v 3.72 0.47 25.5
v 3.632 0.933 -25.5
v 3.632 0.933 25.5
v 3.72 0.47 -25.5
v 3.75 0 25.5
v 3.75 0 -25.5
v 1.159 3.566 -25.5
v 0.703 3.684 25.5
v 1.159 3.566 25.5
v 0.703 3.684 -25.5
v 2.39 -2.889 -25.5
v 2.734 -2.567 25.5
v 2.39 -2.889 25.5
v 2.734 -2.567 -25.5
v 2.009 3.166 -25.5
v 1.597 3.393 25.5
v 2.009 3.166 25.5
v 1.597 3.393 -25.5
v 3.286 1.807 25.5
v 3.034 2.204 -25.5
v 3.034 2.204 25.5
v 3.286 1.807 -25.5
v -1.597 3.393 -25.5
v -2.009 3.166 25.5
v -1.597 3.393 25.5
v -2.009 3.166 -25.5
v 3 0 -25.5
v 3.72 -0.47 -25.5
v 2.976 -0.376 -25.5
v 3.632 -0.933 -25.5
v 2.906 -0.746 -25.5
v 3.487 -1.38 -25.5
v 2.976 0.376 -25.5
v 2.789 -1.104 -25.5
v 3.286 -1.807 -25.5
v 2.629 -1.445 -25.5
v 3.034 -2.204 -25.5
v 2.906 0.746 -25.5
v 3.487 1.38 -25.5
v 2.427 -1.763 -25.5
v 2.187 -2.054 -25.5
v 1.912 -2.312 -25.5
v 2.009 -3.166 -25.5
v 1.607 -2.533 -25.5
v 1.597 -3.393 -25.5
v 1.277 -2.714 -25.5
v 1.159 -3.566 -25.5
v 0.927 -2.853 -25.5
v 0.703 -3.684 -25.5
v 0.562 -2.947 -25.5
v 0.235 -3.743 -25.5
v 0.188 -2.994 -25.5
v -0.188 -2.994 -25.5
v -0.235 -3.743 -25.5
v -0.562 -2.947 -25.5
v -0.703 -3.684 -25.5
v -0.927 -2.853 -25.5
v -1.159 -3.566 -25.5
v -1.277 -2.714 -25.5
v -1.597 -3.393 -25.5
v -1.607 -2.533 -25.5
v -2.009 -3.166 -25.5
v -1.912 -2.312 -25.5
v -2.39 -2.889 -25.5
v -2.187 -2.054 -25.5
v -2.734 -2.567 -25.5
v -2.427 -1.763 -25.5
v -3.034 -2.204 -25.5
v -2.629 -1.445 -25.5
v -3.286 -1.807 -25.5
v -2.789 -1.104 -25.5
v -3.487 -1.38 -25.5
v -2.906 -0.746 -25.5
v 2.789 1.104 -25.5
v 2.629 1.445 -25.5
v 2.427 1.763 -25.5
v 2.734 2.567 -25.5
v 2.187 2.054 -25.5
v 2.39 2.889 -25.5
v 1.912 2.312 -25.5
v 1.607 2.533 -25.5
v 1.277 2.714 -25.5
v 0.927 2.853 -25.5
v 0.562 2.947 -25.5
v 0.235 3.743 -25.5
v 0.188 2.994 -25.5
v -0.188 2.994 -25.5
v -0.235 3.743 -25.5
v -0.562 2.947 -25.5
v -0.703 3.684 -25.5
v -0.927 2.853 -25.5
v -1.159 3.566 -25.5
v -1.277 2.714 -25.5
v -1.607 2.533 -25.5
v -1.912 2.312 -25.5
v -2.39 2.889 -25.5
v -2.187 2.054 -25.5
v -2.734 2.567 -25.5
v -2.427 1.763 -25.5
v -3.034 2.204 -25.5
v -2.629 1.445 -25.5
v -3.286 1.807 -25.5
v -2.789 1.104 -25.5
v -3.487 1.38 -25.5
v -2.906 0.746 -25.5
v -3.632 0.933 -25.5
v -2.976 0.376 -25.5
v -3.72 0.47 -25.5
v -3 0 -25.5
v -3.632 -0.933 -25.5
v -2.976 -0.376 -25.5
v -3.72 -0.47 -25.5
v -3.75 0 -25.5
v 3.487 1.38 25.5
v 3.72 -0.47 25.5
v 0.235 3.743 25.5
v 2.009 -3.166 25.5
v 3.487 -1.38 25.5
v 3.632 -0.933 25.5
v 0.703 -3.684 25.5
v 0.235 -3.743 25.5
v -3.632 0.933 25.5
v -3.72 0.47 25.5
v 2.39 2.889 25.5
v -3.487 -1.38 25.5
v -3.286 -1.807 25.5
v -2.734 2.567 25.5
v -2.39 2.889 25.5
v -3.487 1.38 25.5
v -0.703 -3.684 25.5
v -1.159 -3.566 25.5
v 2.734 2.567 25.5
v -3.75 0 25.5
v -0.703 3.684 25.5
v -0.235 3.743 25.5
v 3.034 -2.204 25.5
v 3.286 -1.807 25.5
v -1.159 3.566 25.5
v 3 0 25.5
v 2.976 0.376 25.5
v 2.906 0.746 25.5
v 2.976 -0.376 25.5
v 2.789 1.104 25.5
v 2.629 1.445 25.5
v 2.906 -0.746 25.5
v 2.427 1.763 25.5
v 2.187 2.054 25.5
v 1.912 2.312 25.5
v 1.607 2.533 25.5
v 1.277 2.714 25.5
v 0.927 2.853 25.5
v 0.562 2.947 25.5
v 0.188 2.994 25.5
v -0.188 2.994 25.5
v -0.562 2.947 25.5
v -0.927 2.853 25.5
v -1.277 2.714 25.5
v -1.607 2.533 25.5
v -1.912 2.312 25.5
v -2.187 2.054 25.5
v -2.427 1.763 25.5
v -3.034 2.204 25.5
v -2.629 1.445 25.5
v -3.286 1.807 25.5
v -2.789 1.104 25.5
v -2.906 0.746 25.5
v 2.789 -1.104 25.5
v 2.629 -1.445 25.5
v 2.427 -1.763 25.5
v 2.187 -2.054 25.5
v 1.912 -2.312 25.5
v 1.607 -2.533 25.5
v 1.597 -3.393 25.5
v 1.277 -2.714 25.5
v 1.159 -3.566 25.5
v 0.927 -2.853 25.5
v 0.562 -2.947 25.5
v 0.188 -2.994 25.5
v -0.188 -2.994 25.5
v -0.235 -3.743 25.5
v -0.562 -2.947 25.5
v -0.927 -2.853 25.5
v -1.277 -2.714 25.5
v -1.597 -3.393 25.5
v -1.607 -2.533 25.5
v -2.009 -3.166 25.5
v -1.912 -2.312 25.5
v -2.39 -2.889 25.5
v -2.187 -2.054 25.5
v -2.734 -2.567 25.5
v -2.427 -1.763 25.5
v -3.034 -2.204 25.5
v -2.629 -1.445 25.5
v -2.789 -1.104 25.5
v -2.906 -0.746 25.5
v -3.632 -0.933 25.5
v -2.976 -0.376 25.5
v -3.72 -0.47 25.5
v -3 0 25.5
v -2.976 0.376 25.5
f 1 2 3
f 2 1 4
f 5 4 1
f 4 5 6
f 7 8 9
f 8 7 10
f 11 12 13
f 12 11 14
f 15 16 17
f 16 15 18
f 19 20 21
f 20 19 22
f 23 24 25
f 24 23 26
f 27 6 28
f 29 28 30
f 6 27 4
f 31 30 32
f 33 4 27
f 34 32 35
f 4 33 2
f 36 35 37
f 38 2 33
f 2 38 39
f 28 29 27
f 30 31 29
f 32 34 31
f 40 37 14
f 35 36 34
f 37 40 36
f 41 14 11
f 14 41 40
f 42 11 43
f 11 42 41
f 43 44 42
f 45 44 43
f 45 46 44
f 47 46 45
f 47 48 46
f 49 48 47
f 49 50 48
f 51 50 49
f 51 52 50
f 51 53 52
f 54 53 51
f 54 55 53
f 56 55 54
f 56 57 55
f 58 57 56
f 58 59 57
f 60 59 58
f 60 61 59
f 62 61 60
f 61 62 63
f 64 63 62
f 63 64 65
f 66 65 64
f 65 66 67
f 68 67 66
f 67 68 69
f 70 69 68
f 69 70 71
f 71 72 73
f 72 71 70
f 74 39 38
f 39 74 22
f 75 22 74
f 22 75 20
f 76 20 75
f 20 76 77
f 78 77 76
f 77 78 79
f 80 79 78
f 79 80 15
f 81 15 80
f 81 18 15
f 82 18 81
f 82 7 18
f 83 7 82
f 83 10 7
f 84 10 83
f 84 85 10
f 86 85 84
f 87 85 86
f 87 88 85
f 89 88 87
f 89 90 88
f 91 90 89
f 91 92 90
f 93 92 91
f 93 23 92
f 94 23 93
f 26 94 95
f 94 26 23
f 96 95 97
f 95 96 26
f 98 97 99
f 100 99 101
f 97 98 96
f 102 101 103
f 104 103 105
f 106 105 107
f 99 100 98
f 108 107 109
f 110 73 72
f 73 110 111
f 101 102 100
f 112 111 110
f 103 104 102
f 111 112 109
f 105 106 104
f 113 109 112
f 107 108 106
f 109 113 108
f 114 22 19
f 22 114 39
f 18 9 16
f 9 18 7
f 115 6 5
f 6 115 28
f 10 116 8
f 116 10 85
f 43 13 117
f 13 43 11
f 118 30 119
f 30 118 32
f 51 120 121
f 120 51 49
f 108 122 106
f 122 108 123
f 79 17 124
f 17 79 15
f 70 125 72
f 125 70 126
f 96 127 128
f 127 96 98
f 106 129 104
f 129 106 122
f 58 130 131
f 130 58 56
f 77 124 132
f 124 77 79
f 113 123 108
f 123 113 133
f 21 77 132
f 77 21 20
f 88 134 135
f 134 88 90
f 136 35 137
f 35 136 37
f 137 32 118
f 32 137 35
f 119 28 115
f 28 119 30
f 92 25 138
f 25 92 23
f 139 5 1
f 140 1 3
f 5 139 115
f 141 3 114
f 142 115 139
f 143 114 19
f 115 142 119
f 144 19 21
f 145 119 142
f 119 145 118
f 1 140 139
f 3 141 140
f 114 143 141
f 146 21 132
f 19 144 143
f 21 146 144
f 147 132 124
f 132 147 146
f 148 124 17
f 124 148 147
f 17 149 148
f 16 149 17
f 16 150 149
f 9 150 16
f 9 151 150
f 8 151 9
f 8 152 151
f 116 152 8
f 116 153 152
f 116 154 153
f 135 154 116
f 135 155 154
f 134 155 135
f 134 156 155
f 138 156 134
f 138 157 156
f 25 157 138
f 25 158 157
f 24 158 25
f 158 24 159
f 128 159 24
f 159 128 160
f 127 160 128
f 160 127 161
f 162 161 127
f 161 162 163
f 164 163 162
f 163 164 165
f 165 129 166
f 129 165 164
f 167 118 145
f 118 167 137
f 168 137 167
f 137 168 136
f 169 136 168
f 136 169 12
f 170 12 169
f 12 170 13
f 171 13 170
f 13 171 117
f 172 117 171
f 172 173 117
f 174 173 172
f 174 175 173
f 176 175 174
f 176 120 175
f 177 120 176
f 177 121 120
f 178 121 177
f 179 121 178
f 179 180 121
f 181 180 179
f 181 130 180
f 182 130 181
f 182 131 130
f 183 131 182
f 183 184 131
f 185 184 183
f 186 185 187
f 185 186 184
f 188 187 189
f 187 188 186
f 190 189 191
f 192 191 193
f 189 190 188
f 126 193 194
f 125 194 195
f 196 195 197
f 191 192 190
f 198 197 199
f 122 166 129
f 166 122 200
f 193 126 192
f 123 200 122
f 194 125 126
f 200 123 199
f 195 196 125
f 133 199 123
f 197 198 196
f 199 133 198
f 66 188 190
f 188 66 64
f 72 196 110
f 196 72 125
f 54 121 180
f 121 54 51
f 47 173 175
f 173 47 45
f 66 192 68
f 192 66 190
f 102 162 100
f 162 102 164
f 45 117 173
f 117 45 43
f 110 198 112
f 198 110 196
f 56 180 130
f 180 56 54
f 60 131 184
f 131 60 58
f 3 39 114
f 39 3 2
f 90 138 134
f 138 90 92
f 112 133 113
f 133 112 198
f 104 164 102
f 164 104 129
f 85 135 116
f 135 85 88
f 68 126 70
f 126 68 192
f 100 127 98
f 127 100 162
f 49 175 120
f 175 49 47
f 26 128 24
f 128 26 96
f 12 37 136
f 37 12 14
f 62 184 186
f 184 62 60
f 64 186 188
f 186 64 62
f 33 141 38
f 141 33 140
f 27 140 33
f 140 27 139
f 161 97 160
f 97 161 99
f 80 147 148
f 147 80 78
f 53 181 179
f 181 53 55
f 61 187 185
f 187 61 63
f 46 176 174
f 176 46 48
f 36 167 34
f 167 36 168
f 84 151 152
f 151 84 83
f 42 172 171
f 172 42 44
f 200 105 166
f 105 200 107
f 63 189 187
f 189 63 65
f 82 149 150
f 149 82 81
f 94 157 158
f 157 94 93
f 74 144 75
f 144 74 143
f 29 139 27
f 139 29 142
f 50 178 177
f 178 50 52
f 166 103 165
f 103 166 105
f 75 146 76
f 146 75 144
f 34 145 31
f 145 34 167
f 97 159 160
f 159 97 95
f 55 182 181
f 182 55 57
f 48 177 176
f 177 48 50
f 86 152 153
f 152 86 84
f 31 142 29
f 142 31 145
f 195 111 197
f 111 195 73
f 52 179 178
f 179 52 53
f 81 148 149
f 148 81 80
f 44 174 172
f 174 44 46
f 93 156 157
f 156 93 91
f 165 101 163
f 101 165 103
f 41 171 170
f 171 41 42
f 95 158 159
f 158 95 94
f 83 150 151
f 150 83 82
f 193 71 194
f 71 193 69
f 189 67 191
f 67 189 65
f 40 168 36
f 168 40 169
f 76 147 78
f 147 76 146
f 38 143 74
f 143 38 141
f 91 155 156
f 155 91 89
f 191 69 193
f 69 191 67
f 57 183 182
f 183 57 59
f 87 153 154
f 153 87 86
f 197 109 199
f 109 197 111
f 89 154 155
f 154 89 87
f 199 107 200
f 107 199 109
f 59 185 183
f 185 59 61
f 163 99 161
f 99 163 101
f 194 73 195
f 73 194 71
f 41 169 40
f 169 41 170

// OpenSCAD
$fn = 50;


difference() {
	union() {
		translate(v = [0, 0, -25.5000000000]) {
			cylinder(h = 51, r = 3.7500000000);
		}
	}
	union() {
		translate(v = [0, 0, -100.0000000000]) {
			cylinder(h = 200, r = 3.0000000000);
		}
	}
}
